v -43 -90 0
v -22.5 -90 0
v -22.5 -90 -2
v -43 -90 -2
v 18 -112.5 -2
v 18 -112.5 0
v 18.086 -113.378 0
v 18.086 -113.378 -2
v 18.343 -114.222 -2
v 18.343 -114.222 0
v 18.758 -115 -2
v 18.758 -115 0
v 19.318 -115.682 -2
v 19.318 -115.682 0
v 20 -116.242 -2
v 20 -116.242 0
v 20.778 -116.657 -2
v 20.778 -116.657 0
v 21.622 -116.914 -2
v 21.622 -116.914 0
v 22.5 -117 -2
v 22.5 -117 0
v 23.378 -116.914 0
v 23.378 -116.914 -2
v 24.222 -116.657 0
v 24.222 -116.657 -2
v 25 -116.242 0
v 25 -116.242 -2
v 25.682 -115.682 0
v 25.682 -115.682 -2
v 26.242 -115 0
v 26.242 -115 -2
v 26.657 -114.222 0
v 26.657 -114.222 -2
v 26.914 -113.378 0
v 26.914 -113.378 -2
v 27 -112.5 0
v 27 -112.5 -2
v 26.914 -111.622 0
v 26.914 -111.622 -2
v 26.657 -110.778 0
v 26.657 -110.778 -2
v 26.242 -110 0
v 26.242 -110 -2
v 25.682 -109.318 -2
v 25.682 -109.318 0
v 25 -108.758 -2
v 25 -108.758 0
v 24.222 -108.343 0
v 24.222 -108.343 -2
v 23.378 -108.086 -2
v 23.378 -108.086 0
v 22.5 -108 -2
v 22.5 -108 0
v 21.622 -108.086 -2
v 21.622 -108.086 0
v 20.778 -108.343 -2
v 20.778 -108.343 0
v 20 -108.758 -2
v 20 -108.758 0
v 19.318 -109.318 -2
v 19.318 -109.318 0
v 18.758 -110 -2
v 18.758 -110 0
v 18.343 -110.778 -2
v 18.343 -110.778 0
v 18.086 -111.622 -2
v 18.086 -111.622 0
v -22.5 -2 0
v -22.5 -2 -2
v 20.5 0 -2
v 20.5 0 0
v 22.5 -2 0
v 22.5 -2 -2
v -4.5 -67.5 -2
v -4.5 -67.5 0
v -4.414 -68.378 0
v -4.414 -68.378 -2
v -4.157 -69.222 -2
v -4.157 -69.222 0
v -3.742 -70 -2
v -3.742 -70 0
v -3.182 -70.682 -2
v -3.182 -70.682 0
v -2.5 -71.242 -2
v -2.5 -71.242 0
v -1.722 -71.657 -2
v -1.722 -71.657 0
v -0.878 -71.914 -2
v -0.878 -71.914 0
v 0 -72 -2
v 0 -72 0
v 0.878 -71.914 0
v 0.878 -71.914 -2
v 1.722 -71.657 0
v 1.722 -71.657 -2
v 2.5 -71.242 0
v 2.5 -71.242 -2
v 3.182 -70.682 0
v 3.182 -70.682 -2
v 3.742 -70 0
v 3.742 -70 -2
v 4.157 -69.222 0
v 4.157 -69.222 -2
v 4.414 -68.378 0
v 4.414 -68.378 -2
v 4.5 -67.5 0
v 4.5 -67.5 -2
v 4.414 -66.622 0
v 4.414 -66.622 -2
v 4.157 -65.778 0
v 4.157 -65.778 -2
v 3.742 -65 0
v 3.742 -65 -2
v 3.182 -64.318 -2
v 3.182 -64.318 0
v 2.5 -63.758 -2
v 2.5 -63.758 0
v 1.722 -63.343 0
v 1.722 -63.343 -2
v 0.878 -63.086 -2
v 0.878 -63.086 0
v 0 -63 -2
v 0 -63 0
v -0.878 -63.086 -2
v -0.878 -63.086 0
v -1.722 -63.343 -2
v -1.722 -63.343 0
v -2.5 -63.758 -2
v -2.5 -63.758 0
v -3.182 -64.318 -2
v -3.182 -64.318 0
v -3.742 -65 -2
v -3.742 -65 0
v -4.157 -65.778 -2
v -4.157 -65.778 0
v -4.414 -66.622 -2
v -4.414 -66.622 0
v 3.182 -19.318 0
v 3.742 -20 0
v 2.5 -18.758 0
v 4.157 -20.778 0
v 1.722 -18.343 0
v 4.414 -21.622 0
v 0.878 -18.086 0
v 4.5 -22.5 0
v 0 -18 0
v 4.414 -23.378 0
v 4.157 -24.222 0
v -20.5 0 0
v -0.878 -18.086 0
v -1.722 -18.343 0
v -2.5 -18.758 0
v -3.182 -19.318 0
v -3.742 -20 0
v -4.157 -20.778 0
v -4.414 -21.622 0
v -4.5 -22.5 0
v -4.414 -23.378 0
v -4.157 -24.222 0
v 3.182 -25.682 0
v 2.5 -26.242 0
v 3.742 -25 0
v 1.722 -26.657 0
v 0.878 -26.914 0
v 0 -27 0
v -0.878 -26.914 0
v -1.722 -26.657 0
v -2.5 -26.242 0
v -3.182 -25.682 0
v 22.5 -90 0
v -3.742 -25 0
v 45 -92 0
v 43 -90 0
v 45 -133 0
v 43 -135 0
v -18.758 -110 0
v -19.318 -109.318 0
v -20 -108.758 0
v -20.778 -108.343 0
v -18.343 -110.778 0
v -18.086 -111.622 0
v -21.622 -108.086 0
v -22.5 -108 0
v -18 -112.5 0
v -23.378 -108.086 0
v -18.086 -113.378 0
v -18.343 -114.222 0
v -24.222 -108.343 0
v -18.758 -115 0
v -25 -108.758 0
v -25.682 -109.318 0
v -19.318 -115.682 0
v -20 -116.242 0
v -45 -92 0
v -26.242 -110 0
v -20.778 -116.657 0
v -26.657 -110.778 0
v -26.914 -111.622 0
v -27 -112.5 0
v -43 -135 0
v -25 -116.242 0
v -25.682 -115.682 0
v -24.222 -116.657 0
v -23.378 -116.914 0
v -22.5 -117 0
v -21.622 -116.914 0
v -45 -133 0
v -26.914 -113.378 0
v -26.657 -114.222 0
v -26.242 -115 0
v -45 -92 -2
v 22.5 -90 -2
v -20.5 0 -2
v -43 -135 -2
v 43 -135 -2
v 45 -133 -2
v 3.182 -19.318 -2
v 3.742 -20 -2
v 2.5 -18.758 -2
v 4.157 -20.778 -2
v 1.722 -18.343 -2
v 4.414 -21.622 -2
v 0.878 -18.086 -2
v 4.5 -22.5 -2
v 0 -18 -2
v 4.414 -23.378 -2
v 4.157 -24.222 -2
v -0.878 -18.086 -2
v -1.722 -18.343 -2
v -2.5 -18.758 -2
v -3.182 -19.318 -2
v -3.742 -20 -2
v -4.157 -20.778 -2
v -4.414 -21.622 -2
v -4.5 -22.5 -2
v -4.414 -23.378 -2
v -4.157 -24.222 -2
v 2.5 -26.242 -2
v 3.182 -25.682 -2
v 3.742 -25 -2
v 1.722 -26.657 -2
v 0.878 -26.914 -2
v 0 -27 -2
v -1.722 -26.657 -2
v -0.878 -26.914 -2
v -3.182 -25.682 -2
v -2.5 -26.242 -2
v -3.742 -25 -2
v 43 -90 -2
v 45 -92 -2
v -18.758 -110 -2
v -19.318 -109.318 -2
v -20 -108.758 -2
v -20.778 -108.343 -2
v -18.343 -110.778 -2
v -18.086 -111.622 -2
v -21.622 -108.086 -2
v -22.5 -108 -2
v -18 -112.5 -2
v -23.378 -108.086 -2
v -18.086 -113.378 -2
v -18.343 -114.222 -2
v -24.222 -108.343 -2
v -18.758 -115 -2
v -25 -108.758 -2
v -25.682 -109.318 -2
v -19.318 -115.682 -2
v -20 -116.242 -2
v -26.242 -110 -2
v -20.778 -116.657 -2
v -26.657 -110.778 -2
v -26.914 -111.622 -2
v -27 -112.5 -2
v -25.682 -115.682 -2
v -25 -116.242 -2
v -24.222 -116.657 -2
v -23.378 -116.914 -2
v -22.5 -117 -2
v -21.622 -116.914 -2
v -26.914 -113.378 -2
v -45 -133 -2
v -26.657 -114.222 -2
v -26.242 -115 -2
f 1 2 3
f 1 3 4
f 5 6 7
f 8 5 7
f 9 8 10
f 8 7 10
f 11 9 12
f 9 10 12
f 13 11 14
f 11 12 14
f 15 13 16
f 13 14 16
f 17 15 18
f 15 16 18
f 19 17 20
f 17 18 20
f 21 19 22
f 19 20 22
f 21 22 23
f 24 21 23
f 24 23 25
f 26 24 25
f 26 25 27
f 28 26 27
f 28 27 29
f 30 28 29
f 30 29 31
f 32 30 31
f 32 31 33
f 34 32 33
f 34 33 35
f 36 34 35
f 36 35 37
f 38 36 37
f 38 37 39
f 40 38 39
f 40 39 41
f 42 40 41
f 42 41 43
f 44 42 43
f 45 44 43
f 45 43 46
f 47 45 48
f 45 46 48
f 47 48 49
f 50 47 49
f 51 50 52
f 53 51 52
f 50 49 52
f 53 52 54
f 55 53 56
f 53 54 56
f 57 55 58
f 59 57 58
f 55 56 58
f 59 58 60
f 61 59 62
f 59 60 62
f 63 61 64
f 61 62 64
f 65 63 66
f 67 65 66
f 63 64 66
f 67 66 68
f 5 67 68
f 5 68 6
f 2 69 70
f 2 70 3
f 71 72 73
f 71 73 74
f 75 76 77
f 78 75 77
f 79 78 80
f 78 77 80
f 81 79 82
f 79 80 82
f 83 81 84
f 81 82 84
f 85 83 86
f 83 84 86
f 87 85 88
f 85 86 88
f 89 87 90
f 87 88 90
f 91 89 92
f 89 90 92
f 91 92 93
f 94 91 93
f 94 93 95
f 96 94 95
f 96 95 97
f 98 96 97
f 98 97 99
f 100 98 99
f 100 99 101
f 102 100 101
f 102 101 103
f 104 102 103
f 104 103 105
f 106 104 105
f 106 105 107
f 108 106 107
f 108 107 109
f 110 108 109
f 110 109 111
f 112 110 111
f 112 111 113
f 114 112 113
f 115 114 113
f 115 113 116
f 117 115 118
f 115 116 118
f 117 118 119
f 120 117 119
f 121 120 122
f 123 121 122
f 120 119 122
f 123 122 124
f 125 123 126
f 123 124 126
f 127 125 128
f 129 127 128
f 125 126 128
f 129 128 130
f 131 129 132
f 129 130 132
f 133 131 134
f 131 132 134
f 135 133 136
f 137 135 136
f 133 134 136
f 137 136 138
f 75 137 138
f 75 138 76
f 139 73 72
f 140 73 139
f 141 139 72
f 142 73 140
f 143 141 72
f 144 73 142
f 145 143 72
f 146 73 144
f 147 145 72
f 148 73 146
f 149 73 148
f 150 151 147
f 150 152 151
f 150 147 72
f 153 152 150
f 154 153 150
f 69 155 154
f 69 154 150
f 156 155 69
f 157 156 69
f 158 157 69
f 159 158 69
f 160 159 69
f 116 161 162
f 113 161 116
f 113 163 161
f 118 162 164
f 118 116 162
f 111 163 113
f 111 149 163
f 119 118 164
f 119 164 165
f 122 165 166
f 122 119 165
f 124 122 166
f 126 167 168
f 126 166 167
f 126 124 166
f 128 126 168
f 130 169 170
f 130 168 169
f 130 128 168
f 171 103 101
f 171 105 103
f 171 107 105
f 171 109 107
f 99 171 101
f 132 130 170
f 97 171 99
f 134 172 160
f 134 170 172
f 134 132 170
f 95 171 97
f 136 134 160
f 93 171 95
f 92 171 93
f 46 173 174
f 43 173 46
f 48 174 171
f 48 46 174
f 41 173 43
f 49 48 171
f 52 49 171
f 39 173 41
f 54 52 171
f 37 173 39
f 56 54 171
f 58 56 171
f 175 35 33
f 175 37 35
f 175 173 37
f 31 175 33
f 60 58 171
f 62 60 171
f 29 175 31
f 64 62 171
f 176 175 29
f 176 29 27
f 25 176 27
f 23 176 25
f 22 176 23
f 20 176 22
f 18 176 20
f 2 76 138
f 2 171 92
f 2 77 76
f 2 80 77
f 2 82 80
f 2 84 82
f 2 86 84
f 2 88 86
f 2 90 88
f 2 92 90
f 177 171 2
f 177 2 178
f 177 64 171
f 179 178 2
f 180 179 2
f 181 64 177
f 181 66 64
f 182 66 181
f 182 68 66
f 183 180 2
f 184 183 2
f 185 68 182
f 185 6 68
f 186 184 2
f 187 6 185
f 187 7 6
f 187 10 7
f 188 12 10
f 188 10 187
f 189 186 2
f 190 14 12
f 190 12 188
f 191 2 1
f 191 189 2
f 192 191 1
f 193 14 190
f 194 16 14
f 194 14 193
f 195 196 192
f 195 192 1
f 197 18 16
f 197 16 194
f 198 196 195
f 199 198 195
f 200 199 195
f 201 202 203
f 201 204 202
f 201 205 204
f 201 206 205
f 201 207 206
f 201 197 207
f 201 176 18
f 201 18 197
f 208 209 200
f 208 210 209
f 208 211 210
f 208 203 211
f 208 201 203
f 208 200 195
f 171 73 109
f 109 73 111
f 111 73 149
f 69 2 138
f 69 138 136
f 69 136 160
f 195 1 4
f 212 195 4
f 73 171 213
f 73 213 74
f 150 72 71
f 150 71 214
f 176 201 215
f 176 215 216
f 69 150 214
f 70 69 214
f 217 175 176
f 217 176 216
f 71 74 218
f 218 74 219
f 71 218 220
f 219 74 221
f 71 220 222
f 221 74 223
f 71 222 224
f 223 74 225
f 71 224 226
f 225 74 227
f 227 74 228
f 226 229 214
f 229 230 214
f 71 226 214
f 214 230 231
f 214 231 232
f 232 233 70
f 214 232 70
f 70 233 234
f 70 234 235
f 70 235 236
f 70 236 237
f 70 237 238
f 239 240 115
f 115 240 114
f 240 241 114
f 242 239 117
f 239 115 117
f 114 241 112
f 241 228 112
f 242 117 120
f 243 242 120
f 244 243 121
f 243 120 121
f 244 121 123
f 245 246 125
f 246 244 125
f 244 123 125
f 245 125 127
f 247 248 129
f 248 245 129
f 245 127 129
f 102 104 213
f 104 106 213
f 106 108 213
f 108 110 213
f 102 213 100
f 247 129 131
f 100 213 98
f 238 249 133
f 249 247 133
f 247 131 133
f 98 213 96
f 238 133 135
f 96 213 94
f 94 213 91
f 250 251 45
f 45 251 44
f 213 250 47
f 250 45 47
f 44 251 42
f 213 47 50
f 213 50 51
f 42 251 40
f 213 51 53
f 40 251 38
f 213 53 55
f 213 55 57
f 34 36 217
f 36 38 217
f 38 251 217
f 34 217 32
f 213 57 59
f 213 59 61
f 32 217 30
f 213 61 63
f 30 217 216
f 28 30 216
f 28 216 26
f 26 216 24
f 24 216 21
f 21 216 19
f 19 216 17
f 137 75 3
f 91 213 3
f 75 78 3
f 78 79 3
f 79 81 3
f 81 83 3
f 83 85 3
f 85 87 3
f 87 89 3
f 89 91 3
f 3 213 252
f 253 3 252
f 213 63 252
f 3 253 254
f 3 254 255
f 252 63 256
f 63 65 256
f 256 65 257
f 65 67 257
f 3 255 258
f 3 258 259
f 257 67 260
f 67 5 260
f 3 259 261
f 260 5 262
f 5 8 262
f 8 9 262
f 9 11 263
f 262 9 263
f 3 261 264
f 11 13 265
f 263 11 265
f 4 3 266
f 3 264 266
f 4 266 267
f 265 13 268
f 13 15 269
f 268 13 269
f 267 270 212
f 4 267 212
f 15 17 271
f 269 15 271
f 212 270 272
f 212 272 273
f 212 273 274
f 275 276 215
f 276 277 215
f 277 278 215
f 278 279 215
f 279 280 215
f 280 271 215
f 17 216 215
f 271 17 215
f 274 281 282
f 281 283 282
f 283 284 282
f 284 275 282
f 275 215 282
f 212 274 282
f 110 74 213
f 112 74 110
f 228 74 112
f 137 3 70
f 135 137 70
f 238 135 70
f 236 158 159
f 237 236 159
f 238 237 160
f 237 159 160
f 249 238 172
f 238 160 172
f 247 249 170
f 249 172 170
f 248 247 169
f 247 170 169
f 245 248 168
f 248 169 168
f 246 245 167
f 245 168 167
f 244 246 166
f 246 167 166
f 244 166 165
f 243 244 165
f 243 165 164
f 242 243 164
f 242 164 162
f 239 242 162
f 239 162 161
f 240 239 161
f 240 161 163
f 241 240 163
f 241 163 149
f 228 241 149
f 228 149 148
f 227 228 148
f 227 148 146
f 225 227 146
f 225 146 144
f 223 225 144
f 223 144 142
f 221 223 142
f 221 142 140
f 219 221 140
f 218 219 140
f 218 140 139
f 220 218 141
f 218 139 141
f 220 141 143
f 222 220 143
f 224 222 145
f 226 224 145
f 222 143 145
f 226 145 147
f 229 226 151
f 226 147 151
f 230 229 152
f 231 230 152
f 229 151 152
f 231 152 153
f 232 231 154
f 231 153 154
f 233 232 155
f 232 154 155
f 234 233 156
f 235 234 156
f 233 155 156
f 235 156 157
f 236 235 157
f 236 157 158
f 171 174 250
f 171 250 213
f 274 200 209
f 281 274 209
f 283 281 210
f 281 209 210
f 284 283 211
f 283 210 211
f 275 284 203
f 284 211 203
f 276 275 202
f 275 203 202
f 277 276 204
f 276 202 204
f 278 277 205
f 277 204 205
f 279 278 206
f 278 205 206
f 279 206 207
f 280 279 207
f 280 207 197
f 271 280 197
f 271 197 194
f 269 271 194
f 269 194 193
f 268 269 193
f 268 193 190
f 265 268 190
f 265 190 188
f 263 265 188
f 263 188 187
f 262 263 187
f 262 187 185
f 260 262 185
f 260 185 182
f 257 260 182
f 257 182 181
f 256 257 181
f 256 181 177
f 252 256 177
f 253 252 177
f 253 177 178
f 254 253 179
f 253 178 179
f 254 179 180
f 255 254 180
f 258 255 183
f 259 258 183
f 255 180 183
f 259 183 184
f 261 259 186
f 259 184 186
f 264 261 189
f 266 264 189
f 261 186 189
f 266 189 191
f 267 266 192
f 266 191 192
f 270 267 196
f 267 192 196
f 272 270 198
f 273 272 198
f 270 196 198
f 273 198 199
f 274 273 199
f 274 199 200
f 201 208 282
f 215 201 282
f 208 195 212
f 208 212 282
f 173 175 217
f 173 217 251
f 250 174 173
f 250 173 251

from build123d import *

# Parameters (mm, degrees)
EXTRUDE_1_DEPTH   = 2
HOLE_WIZARD_M81_D = 9
CHAMFER_1_SIZE    = 2


with BuildPart() as part:
    # Эскиз1 → Бобышка-Вытянуть1 (new body)
    with BuildSketch(Plane(origin=(0, 0, 0), x_dir=(1, 0, 0), z_dir=(0, 0, -1))):
        Polygon((-45, 135), (45, 135), (45, 90), (22.5, 90), (22.5, 0), (-22.5, 0), (-22.5, 90), (-45, 90), align=None)
    extrude(amount=EXTRUDE_1_DEPTH)

    # Отверстие с зазором M81 (through all)
    with Locations(Plane(origin=(0, 0, -2), x_dir=(1, 0, 0), z_dir=(0, 0, -1))):
        with Locations((0, 22.5), (-22.5, 112.5), (22.5, 112.5), (0, 67.5)):
            Hole(HOLE_WIZARD_M81_D / 2)

    # Фаска1
    chamfer_1_edges = [part.edges().sort_by_distance(p)[0] for p in [
        (-45, -90, -1),
        (-45, -135, -1),
        (45, -135, -1),
        (45, -90, -1),
        (22.5, 0, -1),
        (-22.5, 0, -1),
    ]]
    chamfer(chamfer_1_edges, length=CHAMFER_1_SIZE)


solid = part.part
